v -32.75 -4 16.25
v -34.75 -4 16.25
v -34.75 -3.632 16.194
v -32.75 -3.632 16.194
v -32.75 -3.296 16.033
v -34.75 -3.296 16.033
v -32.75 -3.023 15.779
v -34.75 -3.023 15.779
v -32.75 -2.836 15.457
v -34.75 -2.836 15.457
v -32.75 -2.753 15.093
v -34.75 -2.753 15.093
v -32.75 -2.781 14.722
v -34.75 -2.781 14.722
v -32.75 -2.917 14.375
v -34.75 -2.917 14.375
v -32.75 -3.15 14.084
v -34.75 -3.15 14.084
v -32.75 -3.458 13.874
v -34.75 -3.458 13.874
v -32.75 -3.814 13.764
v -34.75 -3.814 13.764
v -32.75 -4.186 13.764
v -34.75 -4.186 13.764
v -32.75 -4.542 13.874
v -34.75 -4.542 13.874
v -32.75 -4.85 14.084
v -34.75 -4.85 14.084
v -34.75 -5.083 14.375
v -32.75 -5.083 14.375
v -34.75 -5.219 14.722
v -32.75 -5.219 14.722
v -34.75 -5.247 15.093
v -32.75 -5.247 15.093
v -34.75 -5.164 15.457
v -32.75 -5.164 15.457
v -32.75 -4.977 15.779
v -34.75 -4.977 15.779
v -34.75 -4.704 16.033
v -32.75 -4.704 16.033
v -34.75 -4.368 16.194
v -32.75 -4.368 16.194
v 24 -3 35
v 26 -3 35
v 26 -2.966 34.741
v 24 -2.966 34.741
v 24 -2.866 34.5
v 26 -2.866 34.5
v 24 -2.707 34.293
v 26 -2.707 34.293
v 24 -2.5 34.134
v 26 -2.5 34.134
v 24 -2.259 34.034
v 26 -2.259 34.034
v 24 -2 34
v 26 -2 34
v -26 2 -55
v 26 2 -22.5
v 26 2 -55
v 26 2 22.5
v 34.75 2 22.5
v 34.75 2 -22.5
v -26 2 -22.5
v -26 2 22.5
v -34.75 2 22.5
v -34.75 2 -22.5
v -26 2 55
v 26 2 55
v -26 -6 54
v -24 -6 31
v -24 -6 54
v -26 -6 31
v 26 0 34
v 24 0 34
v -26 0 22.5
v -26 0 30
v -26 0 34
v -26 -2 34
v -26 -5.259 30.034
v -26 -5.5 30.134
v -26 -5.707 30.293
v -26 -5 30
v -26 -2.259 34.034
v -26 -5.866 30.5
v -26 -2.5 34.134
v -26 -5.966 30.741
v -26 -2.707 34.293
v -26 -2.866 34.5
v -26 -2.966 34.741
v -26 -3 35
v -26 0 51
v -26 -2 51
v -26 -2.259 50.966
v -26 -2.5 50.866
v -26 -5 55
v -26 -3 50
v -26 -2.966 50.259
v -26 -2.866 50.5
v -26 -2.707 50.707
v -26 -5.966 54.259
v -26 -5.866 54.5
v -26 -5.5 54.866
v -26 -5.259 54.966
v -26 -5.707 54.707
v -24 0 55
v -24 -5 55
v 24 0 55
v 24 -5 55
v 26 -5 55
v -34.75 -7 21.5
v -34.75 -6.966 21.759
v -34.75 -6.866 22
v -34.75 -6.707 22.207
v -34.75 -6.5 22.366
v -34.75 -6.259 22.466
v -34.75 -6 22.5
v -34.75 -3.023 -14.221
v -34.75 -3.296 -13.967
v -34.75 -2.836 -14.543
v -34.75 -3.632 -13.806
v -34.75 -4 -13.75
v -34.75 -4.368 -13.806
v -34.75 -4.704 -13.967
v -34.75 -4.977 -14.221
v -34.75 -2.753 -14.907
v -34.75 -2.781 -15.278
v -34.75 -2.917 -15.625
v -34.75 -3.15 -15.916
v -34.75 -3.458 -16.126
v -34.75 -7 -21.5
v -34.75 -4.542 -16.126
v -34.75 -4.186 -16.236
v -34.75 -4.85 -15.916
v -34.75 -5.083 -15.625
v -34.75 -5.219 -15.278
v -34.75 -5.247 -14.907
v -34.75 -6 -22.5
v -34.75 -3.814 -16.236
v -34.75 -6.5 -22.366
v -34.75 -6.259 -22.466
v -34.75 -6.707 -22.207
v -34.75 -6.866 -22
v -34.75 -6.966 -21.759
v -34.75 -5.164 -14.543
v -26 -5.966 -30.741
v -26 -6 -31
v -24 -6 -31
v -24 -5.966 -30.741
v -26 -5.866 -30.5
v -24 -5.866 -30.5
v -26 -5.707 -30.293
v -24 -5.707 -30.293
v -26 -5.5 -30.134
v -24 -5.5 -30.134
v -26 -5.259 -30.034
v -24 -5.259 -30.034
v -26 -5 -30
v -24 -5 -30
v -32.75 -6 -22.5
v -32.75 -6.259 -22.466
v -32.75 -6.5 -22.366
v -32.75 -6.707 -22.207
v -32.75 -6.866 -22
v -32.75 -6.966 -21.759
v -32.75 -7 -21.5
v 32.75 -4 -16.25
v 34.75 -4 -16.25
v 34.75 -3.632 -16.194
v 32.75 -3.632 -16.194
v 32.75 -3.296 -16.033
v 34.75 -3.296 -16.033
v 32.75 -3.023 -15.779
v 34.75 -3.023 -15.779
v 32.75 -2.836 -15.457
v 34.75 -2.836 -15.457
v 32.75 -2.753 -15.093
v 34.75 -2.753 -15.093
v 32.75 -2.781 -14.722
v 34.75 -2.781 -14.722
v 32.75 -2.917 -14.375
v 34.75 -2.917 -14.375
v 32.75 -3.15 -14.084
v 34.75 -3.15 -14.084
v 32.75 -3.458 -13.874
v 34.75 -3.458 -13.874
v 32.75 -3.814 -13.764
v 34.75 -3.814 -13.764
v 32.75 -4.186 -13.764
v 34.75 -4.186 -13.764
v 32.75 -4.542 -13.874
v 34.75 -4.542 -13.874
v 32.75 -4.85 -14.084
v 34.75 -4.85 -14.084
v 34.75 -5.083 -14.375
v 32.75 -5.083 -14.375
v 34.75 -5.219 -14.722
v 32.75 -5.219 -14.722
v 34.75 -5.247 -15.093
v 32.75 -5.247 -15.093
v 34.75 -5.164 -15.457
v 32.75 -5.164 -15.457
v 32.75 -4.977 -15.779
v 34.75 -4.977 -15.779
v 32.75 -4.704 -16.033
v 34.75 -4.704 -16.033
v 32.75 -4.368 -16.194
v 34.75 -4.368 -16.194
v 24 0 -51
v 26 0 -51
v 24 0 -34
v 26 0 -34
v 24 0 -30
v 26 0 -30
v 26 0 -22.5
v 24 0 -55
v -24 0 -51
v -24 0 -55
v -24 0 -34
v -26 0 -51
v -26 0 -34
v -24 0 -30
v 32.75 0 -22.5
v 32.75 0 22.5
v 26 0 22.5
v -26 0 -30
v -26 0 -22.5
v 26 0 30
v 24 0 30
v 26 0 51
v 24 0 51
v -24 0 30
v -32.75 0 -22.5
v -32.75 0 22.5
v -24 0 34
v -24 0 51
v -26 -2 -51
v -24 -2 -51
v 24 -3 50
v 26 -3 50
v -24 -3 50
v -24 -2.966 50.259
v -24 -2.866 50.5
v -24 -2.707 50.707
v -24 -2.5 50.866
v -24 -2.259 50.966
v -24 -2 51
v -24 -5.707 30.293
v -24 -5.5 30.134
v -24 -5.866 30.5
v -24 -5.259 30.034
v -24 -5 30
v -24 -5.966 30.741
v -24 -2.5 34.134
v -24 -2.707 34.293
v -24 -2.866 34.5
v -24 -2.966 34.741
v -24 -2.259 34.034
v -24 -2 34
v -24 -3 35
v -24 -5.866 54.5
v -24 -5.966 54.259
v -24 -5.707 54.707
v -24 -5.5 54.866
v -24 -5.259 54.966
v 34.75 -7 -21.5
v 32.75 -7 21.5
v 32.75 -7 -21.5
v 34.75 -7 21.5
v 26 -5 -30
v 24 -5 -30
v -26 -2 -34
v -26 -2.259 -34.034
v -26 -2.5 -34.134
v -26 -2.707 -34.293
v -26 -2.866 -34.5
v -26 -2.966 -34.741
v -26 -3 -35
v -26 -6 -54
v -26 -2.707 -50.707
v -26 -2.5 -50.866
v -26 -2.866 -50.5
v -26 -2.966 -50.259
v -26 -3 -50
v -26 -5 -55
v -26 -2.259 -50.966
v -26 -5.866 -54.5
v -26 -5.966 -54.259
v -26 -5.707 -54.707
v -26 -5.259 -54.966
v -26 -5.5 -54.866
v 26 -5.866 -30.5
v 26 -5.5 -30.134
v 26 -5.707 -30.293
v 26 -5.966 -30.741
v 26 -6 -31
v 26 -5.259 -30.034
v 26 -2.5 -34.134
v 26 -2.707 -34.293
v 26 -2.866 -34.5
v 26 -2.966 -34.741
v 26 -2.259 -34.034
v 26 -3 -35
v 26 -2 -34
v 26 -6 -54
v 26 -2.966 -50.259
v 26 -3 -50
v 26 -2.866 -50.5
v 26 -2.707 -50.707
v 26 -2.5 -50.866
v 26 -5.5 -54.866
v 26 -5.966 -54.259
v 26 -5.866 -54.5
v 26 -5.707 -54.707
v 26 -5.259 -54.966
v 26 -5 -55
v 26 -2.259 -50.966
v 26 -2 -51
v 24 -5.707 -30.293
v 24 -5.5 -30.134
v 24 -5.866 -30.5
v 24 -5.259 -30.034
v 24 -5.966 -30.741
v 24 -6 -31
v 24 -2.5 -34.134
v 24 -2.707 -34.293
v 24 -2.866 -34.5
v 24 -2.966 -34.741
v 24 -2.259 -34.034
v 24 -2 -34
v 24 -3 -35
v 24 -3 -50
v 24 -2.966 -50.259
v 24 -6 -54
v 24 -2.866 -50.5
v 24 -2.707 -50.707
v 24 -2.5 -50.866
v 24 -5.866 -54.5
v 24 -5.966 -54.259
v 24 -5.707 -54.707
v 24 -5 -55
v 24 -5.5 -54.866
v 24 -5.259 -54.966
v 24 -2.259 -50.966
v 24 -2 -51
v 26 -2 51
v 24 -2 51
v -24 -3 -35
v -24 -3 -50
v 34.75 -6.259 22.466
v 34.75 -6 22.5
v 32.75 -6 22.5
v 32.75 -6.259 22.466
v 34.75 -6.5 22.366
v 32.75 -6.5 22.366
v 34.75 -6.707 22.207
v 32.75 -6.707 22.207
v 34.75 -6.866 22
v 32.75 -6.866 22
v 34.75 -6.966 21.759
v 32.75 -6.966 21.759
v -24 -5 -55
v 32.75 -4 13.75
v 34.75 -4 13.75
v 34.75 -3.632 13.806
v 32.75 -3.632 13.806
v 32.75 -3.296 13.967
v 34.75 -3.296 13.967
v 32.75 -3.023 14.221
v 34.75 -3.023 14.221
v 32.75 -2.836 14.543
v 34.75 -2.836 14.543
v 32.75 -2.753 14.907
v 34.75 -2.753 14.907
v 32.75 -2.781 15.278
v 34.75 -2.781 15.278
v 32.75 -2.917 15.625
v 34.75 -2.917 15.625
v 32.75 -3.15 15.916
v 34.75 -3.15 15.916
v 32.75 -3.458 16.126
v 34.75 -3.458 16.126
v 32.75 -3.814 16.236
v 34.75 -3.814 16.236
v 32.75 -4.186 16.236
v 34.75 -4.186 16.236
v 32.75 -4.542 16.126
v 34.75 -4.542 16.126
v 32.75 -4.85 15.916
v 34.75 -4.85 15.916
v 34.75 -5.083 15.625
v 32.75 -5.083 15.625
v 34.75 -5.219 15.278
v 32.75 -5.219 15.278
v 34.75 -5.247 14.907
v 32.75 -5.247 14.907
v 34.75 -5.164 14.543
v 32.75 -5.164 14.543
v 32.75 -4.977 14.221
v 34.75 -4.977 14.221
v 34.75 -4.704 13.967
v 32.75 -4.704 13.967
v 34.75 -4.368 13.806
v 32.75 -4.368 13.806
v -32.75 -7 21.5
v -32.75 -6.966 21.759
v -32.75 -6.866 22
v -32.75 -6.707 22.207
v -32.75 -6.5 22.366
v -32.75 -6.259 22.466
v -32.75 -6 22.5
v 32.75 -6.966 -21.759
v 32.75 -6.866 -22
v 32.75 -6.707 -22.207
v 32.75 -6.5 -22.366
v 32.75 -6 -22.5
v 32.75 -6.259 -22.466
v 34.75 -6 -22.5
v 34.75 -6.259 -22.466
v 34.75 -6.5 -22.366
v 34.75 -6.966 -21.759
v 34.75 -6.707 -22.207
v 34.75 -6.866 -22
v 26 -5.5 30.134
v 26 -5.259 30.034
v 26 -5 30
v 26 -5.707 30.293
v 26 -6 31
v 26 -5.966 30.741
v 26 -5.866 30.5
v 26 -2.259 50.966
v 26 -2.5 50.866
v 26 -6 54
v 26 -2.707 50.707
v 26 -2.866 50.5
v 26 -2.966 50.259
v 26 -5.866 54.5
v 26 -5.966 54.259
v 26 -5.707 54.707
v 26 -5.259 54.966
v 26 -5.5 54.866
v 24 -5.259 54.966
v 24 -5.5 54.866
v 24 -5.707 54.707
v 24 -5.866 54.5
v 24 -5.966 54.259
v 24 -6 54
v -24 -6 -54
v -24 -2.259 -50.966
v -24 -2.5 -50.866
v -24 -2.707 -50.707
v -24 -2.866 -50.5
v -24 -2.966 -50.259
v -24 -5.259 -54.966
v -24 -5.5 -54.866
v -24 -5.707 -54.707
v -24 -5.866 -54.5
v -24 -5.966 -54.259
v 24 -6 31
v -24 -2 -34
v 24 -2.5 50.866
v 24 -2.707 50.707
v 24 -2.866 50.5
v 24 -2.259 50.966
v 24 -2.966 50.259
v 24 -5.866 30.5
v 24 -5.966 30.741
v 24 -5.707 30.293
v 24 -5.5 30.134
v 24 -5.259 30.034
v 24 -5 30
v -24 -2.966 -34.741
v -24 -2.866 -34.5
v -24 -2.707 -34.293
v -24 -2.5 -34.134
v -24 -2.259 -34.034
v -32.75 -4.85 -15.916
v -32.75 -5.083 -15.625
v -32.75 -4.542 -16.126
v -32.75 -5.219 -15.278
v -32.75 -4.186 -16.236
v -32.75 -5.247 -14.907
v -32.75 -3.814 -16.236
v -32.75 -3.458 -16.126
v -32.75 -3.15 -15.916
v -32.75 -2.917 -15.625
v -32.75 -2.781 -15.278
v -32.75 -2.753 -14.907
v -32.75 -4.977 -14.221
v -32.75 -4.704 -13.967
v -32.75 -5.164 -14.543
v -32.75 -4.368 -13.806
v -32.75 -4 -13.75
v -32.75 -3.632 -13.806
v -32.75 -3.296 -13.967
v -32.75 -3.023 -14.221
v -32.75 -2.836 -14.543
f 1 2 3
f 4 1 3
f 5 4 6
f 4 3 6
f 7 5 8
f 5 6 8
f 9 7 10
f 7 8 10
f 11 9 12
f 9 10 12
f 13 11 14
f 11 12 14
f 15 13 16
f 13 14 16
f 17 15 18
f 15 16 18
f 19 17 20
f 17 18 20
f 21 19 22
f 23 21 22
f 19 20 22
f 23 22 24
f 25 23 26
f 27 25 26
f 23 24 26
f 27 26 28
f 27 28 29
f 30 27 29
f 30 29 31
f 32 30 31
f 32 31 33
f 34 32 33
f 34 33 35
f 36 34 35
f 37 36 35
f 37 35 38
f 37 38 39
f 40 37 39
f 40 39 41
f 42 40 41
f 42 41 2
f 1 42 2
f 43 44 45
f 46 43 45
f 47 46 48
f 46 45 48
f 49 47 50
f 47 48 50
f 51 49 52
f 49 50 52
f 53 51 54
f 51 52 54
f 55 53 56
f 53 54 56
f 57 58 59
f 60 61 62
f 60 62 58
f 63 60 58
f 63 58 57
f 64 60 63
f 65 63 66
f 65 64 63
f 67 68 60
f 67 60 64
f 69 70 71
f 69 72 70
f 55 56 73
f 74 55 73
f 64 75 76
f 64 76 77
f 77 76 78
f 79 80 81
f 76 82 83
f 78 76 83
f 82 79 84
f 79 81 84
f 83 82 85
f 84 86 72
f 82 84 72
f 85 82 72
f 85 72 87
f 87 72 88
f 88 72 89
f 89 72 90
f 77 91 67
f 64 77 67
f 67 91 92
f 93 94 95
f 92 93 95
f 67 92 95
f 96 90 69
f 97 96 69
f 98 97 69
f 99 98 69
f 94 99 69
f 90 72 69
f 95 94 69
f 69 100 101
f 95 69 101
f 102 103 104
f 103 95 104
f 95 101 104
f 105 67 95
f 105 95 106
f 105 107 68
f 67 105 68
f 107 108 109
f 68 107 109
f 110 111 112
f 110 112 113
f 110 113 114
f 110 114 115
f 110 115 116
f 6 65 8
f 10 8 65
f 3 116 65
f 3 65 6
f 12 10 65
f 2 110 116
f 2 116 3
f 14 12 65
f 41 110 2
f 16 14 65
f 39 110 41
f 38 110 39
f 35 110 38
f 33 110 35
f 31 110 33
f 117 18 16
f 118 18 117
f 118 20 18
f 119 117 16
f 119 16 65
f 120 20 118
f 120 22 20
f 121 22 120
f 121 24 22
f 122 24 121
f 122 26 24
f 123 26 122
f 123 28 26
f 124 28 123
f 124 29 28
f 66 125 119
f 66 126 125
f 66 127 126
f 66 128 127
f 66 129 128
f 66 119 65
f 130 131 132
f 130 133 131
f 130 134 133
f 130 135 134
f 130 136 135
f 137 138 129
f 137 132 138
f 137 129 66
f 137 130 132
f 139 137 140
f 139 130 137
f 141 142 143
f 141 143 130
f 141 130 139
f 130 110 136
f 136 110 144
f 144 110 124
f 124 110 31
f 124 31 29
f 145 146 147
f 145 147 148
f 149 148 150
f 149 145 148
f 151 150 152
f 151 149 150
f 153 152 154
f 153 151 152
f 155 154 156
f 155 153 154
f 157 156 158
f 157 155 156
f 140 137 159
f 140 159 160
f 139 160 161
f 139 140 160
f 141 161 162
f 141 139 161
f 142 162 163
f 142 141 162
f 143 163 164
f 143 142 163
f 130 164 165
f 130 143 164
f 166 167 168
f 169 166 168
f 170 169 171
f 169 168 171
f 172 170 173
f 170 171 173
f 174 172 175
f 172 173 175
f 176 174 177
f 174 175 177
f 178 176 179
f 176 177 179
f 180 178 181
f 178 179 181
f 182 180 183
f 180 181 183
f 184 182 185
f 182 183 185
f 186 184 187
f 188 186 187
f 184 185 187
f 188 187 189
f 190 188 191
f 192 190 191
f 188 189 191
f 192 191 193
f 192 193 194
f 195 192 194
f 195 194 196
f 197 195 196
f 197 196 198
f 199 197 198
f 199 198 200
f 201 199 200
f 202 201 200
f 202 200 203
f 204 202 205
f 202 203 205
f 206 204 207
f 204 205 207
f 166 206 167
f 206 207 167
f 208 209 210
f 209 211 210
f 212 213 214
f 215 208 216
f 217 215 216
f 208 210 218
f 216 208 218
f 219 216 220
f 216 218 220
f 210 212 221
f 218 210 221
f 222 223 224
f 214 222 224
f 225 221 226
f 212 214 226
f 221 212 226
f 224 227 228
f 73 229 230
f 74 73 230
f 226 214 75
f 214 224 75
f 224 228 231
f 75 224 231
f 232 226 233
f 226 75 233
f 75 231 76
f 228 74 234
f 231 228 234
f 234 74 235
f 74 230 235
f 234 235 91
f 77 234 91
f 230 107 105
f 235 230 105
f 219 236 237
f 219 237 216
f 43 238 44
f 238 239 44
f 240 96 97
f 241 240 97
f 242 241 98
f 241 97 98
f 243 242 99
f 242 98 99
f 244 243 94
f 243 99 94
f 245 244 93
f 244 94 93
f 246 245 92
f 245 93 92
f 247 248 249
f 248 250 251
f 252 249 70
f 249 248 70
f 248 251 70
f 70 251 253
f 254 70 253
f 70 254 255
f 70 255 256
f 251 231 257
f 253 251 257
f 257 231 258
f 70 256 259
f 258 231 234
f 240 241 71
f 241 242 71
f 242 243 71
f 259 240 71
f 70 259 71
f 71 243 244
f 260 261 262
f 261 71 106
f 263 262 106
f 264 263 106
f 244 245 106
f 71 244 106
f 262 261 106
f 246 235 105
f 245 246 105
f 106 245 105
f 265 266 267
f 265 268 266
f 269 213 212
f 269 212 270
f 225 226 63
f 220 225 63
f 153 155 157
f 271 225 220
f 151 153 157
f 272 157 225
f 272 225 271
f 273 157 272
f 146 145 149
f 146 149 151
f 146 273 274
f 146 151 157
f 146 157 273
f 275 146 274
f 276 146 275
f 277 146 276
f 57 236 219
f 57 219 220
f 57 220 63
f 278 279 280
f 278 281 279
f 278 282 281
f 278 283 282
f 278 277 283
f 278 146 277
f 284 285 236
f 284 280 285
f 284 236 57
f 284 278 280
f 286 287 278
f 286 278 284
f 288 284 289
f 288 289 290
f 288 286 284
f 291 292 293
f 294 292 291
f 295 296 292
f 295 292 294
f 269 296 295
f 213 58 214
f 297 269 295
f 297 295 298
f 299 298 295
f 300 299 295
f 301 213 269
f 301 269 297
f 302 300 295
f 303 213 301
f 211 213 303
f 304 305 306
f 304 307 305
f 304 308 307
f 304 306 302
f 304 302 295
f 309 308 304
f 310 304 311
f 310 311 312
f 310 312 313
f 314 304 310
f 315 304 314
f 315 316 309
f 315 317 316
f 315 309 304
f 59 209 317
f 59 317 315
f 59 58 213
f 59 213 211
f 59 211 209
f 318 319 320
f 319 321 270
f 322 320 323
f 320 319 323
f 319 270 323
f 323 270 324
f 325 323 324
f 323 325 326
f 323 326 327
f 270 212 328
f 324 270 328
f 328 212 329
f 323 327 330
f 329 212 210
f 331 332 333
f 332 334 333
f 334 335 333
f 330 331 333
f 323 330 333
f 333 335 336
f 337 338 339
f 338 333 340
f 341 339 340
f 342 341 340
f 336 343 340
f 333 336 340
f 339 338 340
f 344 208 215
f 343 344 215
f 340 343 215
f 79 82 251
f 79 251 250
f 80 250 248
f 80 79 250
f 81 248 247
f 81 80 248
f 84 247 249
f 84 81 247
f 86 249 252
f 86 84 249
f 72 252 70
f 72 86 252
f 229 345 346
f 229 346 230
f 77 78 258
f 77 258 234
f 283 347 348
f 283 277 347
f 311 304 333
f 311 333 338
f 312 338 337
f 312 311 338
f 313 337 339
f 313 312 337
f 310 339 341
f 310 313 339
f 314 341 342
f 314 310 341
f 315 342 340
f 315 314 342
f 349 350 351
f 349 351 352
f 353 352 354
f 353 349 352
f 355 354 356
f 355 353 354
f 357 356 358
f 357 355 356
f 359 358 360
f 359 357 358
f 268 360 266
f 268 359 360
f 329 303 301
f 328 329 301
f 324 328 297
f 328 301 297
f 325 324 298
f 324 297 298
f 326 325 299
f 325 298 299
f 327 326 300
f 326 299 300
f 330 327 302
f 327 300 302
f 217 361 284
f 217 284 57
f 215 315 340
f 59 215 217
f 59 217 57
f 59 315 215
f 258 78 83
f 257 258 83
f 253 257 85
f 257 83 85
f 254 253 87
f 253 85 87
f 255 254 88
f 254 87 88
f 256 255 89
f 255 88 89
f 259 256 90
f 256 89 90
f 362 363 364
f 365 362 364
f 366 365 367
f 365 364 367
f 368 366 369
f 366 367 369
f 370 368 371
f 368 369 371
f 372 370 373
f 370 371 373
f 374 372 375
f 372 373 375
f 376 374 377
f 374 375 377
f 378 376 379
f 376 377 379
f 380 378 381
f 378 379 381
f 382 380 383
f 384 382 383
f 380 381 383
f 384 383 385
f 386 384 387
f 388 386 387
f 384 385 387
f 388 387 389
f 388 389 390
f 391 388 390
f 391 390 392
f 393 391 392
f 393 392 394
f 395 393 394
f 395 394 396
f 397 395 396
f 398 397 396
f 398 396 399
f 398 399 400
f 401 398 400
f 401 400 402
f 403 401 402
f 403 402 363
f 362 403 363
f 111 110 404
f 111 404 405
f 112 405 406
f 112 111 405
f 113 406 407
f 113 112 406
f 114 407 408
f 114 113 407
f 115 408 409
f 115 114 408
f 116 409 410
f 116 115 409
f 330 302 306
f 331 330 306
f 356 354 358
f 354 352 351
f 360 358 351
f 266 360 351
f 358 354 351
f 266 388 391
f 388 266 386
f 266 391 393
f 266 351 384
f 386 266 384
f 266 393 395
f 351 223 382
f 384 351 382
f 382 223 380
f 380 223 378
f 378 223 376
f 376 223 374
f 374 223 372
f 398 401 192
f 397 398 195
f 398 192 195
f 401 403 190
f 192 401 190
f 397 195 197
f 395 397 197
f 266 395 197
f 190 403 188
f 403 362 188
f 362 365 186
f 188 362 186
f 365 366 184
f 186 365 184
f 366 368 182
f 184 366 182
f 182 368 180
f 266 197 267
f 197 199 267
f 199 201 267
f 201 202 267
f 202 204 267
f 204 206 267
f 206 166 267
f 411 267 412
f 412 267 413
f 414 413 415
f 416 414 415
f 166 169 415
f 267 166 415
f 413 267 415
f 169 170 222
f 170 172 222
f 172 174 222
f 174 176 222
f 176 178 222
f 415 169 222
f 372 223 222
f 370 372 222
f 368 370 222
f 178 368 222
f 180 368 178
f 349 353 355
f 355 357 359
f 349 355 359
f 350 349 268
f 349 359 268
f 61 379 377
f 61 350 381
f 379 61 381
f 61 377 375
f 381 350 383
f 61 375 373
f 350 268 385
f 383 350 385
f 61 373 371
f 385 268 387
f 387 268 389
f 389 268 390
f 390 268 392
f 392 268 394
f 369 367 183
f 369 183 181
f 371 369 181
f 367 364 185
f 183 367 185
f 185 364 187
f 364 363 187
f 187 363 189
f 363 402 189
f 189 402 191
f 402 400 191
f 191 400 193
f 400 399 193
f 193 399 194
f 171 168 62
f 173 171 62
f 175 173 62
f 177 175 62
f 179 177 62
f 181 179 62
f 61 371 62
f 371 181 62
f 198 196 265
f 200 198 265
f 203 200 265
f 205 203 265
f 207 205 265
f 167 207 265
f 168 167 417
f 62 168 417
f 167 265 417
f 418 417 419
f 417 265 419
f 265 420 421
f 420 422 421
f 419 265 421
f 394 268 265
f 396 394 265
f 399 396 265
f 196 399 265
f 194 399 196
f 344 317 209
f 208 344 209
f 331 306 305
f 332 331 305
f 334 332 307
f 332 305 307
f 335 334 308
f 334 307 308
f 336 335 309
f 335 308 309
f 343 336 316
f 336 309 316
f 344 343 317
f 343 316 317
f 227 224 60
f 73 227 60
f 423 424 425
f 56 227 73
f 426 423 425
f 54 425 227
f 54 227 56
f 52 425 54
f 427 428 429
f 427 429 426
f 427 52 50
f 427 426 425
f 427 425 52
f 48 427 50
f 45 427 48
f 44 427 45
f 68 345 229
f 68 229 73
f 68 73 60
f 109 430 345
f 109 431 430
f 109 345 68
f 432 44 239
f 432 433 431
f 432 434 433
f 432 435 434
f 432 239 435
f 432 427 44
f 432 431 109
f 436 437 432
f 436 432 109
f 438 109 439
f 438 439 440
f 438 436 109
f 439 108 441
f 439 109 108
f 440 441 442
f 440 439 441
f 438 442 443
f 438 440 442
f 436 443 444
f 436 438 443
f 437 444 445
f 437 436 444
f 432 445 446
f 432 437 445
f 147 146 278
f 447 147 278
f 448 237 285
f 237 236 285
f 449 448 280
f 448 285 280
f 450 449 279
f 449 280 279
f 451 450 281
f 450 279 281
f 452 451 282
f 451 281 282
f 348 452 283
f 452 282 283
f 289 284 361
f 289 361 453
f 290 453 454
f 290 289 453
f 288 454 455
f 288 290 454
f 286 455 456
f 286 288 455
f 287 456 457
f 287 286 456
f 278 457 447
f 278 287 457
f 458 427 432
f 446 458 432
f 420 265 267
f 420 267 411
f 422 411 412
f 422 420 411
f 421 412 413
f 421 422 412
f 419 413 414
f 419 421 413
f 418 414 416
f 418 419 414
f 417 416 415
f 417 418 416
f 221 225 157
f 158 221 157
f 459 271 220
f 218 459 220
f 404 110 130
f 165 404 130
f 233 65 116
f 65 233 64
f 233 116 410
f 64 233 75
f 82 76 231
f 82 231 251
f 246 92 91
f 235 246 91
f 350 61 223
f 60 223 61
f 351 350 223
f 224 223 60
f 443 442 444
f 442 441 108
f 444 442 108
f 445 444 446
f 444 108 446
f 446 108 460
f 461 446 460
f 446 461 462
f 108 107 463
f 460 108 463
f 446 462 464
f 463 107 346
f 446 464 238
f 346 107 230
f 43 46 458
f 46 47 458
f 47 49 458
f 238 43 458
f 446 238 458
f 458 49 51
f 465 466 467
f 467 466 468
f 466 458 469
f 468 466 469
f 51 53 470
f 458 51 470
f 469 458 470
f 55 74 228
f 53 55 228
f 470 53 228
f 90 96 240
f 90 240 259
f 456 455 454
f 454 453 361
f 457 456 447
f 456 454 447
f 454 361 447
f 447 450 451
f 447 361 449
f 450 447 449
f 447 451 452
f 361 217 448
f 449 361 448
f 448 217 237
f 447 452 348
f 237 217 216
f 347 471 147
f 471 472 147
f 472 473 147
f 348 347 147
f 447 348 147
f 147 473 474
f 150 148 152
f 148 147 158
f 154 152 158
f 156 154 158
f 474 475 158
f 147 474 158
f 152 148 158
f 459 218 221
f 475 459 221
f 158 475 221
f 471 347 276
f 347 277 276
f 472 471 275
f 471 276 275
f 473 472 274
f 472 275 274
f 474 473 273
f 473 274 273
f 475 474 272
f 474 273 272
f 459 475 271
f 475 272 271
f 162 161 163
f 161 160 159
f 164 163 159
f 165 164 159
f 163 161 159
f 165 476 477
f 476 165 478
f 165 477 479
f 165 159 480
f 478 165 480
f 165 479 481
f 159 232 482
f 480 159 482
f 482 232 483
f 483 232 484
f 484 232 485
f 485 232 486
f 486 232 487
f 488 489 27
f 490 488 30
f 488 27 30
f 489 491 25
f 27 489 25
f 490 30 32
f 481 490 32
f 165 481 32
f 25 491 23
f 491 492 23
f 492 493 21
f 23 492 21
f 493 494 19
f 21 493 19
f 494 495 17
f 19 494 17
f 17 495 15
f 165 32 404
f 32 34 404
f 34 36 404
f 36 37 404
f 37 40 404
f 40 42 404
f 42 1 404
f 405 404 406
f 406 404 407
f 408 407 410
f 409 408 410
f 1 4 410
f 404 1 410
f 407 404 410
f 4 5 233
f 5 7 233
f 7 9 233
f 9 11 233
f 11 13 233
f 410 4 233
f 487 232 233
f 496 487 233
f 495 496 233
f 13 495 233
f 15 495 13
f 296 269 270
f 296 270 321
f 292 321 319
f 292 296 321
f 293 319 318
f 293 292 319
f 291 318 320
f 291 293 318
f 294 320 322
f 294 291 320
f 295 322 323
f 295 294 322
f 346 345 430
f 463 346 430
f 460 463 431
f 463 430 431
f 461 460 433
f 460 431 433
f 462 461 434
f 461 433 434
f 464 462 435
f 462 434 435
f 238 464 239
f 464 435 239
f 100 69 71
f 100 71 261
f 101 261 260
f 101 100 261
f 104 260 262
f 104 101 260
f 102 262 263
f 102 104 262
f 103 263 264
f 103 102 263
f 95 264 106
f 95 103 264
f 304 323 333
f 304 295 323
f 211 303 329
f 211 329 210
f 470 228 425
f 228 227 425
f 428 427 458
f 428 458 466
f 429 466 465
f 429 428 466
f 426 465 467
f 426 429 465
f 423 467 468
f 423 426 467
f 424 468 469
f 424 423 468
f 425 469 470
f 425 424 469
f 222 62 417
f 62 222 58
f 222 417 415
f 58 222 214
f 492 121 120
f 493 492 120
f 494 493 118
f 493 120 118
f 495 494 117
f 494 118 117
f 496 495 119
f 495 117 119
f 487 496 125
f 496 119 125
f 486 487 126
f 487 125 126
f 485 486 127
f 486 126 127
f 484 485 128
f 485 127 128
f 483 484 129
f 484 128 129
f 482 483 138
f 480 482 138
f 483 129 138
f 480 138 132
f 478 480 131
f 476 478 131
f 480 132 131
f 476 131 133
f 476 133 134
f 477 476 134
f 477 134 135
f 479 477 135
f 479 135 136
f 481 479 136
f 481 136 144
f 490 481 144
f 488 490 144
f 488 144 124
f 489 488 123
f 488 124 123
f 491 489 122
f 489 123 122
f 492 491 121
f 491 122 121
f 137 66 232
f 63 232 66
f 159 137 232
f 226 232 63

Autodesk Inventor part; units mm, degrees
ref_plane "YZ Plane" through (0, 0, 0) normal (1, 0, 0) x (0, 1, 0)
ref_plane "XZ Plane" through (0, 0, 0) normal (0, 1, 0) x (-1, 0, 0)
ref_plane "XY Plane" through (0, 0, 0) normal (0, 0, 1) x (1, 0, 0)
sketch "Sketch1" plane through (0, 0, 0) normal (0, 1, 0) x (-1, 0, 0)
  line L0 (34.75, 22.5) -> (34.75, -22.5)
  line L1 (-34.75, 22.5) -> (-34.75, -22.5)
  line L2 (34.75, -22.5) -> (26, -22.5)
  line L3 (-34.75, -22.5) -> (-26, -22.5)
  line L4 (34.75, 22.5) -> (26, 22.5)
  line L5 (-34.75, 22.5) -> (-26, 22.5)
  line L6 (-26, -22.5) -> (-26, -55)
  line L7 (26, -22.5) -> (26, -55)
  line L8 (26, 22.5) -> (26, 55)
  line L9 (-26, 22.5) -> (-26, 55)
  line L10 (26, 55) -> (-26, 55)
  line L11 (26, -55) -> (-26, -55)
  point P0 (0, 0)
  dimension "d0" = 45
  dimension "d1" = 34.75
  dimension "d2" = 22.5
  dimension "d3" = 45
  dimension "d4" = 34.75
  dimension "d5" = 22.5
  dimension "d6" = 8.75
  dimension "d7" = 8.75
  dimension "d8" = 8.75
  dimension "d9" = 8.75
  dimension "d10" = 32.5
  dimension "d11" = 32.5
  dimension "d12" = 32.5
  dimension "d13" = 32.5
extrude "Extrusion1" add sketch "Sketch1" along normal blind 2
sketch "Sketch2" plane through (34.75, 0, 22.5) normal (1, 0, 0) x (0, 0, -1)
  line L0 (45, 2) -> (77.5, 2) projected
  line L1 (45, 2) -> (0, 2) projected
  line L2 (45, 2) -> (0, 2)
  line L3 (0, 2) -> (0, -6)
  line L4 (1, -7) -> (44, -7)
  line L5 (45, -6) -> (45, 2)
  line L6 (7.5, -4) -> (37.5, -4) construction
  circle A0 centre (7.5, -4) radius 1.25
  circle A1 centre (37.5, -4) radius 1.25
  arc A2 (0, -6) -> (1, -7) centre (1, -6) ccw
  arc A3 (44, -7) -> (45, -6) centre (44, -6) ccw
  point P0 (22.5, 0)
  point P1 (0, -7)
  point P2 (45, -7)
  dimension "d16" = 9
  dimension "d17" = 45
  dimension "d18" = 30
  dimension "d19" = 3
  dimension "d20" = 7.5
  dimension "d21" = 2.5
  dimension "d22" = 2.5
  dimension "d23" = 1
  dimension "d24" = 1
extrude "Extrusion2" add sketch "Sketch2" against normal blind 2
sketch "Sketch3" plane through (-34.75, 0, -22.5) normal (-1, 0, 0) x (0, 0, 1)
  line L0 (-32.5, 2) -> (0, 2) projected
  line L1 (0, 2) -> (45, 2)
  line L2 (45, 2) -> (45, -6)
  line L3 (44, -7) -> (1, -7)
  line L4 (0, -6) -> (0, 2)
  circle A0 centre (37.5, -4) radius 1.25 projected
  circle A1 centre (37.5, -4) radius 1.25
  circle A2 centre (7.5, -4) radius 1.25 projected
  circle A3 centre (7.5, -4) radius 1.25
  arc A4 (0, -6) -> (1, -7) centre (1, -6) ccw
  arc A5 (44, -7) -> (45, -6) centre (44, -6) ccw
  point P0 (22.5, 0)
  point P1 (45, -7)
  point P2 (0, -7)
  dimension "d27" = 45
  dimension "d28" = 9
  dimension "d29" = 1
extrude "Extrusion3" add sketch "Sketch3" against normal blind 2
sketch "Sketch4" plane through (26, 0, -22.5) normal (1, 0, 0) x (0, 0, -1)
  line L0 (32.5, 2) -> (0, 2) projected
  line L1 (7.5, 2) -> (7.5, -5)
  line L2 (8.5, -6) -> (31.5, -6)
  line L3 (32.5, -5) -> (32.5, 2)
  line L4 (12.5, -3) -> (27.5, -3)
  line L5 (11.5, -2) -> (11.5, 2)
  line L6 (28.5, -2) -> (28.5, 2)
  line L7 (32.5, 2) -> (28.5, 2)
  line L8 (11.5, 2) -> (7.5, 2)
  arc A0 (7.5, -5) -> (8.5, -6) centre (8.5, -5) ccw
  arc A1 (11.5, -2) -> (12.5, -3) centre (12.5, -2) ccw
  arc A2 (27.5, -3) -> (28.5, -2) centre (27.5, -2) ccw
  arc A3 (31.5, -6) -> (32.5, -5) centre (31.5, -5) ccw
  point P0 (-22.5, 0)
  point P1 (7.5, -6)
  point P2 (32.5, -6)
  point P3 (11.5, -3)
  point P4 (28.5, -3)
  dimension "d32" = 25
  dimension "d33" = 8
  dimension "d34" = 17
  dimension "d35" = 4
  dimension "d36" = 3
  dimension "d37" = 8
  dimension "d38" = 1
extrude "Extrusion4" add sketch "Sketch4" against normal blind 2 contours L3 A3 L2 A0 L1 L0 L5 A1 L4 A2 L6
sketch "Sketch5" plane through (26, 0, 55) normal (1, 0, 0) x (0, 0, -1)
  line L0 (0, 2) -> (32.5, 2) projected
  line L1 (25, 2) -> (25, -5)
  line L2 (24, -6) -> (1, -6)
  line L3 (0, -5) -> (0, 2)
  line L4 (5, -3) -> (20, -3)
  line L5 (4, -2) -> (4, 2)
  line L6 (21, -2) -> (21, 2)
  line L7 (0, 2) -> (4, 2)
  line L8 (21, 2) -> (25, 2)
  arc A0 (0, -5) -> (1, -6) centre (1, -5) ccw
  arc A1 (24, -6) -> (25, -5) centre (24, -5) ccw
  arc A2 (4, -2) -> (5, -3) centre (5, -2) ccw
  arc A3 (20, -3) -> (21, -2) centre (20, -2) ccw
  point P0 (55, 0)
  point P1 (25, -6)
  point P2 (0, -6)
  point P3 (4, -3)
  point P4 (21, -3)
  dimension "d41" = 25
  dimension "d42" = 8
  dimension "d43" = 17
  dimension "d44" = 5
  dimension "d45" = 4
  dimension "d46" = 8
  dimension "d47" = 1
  dimension "d65" = 1
extrude "Extrusion5" add sketch "Sketch5" against normal blind 2 contours L0 L5 A2 L4 A3 L6 L1 A1 L2 A0 L3
sketch "Sketch6" plane through (-26, 0, 22.5) normal (-1, 0, 0) x (0, 0, 1)
  line L0 (32.5, 0) -> (32.5, 2) projected
  line L1 (32.5, 2) -> (7.5, 2) construction
  line L2 (7.5, 2) -> (7.5, -5)
  line L3 (8.5, -6) -> (31.5, -6)
  line L4 (32.5, -5) -> (32.5, 2)
  line L5 (27.5, -3) -> (12.5, -3)
  line L6 (28.5, -2) -> (28.5, 2)
  line L7 (0, 2) -> (32.5, 2) projected
  line L8 (11.5, -2) -> (11.5, 2)
  line L9 (32.5, 2) -> (28.5, 2)
  line L10 (11.5, 2) -> (7.5, 2)
  arc A0 (31.5, -6) -> (32.5, -5) centre (31.5, -5) ccw
  arc A1 (7.5, -5) -> (8.5, -6) centre (8.5, -5) ccw
  arc A2 (11.5, -2) -> (12.5, -3) centre (12.5, -2) ccw
  arc A3 (27.5, -3) -> (28.5, -2) centre (27.5, -2) ccw
  line L11 (-77.5, 2) -> (-45, 2) construction
  line L12 (-77.5, 2) -> (-52.5, 2) construction
  line L13 (-52.5, 2) -> (-52.5, -5)
  line L14 (-53.5, -6) -> (-76.5, -6)
  line L15 (-77.5, -5) -> (-77.5, 2)
  line L16 (-57.5, -3) -> (-72.5, -3)
  line L17 (-56.5, -2) -> (-56.5, 2)
  line L18 (-73.5, -2) -> (-73.5, 2)
  line L19 (-52.5, 2) -> (-56.5, 2)
  line L20 (-73.5, 2) -> (-77.5, 2)
  arc A4 (-53.5, -6) -> (-52.5, -5) centre (-53.5, -5) ccw
  arc A5 (-57.5, -3) -> (-56.5, -2) centre (-57.5, -2) ccw
  arc A6 (-73.5, -2) -> (-72.5, -3) centre (-72.5, -2) ccw
  arc A7 (-77.5, -5) -> (-76.5, -6) centre (-76.5, -5) ccw
  point P0 (-22.5, 0)
  point P1 (7.5, -6)
  point P2 (32.5, -6)
  point P3 (28.5, -3)
  point P4 (11.5, -3)
  point P5 (-52.5, -6)
  point P6 (-77.5, -6)
  point P7 (-56.5, -3)
  point P8 (-73.5, -3)
  dimension "d50" = 25
  dimension "d51" = 8
  dimension "d52" = 17
  dimension "d53" = 4
  dimension "d54" = 3
  dimension "d55" = 1
  dimension "d56" = 1
  dimension "d57" = 1
  dimension "d58" = 1
  dimension "d59" = 25
  dimension "d60" = 8
  dimension "d61" = 17
  dimension "d62" = 4
  dimension "d63" = 3
  dimension "d64" = 1
extrude "Extrusion6" add sketch "Sketch6" against normal blind 2 contours L4 A0 L3 A1 L2 L7 L8 A2 L5 A3 L6 L0 | L13 A4 L14 A7 L15 L20 L18 A6 L16 A5 L17 L19
properties part number "RCT-H112_stick_battery_plate"
